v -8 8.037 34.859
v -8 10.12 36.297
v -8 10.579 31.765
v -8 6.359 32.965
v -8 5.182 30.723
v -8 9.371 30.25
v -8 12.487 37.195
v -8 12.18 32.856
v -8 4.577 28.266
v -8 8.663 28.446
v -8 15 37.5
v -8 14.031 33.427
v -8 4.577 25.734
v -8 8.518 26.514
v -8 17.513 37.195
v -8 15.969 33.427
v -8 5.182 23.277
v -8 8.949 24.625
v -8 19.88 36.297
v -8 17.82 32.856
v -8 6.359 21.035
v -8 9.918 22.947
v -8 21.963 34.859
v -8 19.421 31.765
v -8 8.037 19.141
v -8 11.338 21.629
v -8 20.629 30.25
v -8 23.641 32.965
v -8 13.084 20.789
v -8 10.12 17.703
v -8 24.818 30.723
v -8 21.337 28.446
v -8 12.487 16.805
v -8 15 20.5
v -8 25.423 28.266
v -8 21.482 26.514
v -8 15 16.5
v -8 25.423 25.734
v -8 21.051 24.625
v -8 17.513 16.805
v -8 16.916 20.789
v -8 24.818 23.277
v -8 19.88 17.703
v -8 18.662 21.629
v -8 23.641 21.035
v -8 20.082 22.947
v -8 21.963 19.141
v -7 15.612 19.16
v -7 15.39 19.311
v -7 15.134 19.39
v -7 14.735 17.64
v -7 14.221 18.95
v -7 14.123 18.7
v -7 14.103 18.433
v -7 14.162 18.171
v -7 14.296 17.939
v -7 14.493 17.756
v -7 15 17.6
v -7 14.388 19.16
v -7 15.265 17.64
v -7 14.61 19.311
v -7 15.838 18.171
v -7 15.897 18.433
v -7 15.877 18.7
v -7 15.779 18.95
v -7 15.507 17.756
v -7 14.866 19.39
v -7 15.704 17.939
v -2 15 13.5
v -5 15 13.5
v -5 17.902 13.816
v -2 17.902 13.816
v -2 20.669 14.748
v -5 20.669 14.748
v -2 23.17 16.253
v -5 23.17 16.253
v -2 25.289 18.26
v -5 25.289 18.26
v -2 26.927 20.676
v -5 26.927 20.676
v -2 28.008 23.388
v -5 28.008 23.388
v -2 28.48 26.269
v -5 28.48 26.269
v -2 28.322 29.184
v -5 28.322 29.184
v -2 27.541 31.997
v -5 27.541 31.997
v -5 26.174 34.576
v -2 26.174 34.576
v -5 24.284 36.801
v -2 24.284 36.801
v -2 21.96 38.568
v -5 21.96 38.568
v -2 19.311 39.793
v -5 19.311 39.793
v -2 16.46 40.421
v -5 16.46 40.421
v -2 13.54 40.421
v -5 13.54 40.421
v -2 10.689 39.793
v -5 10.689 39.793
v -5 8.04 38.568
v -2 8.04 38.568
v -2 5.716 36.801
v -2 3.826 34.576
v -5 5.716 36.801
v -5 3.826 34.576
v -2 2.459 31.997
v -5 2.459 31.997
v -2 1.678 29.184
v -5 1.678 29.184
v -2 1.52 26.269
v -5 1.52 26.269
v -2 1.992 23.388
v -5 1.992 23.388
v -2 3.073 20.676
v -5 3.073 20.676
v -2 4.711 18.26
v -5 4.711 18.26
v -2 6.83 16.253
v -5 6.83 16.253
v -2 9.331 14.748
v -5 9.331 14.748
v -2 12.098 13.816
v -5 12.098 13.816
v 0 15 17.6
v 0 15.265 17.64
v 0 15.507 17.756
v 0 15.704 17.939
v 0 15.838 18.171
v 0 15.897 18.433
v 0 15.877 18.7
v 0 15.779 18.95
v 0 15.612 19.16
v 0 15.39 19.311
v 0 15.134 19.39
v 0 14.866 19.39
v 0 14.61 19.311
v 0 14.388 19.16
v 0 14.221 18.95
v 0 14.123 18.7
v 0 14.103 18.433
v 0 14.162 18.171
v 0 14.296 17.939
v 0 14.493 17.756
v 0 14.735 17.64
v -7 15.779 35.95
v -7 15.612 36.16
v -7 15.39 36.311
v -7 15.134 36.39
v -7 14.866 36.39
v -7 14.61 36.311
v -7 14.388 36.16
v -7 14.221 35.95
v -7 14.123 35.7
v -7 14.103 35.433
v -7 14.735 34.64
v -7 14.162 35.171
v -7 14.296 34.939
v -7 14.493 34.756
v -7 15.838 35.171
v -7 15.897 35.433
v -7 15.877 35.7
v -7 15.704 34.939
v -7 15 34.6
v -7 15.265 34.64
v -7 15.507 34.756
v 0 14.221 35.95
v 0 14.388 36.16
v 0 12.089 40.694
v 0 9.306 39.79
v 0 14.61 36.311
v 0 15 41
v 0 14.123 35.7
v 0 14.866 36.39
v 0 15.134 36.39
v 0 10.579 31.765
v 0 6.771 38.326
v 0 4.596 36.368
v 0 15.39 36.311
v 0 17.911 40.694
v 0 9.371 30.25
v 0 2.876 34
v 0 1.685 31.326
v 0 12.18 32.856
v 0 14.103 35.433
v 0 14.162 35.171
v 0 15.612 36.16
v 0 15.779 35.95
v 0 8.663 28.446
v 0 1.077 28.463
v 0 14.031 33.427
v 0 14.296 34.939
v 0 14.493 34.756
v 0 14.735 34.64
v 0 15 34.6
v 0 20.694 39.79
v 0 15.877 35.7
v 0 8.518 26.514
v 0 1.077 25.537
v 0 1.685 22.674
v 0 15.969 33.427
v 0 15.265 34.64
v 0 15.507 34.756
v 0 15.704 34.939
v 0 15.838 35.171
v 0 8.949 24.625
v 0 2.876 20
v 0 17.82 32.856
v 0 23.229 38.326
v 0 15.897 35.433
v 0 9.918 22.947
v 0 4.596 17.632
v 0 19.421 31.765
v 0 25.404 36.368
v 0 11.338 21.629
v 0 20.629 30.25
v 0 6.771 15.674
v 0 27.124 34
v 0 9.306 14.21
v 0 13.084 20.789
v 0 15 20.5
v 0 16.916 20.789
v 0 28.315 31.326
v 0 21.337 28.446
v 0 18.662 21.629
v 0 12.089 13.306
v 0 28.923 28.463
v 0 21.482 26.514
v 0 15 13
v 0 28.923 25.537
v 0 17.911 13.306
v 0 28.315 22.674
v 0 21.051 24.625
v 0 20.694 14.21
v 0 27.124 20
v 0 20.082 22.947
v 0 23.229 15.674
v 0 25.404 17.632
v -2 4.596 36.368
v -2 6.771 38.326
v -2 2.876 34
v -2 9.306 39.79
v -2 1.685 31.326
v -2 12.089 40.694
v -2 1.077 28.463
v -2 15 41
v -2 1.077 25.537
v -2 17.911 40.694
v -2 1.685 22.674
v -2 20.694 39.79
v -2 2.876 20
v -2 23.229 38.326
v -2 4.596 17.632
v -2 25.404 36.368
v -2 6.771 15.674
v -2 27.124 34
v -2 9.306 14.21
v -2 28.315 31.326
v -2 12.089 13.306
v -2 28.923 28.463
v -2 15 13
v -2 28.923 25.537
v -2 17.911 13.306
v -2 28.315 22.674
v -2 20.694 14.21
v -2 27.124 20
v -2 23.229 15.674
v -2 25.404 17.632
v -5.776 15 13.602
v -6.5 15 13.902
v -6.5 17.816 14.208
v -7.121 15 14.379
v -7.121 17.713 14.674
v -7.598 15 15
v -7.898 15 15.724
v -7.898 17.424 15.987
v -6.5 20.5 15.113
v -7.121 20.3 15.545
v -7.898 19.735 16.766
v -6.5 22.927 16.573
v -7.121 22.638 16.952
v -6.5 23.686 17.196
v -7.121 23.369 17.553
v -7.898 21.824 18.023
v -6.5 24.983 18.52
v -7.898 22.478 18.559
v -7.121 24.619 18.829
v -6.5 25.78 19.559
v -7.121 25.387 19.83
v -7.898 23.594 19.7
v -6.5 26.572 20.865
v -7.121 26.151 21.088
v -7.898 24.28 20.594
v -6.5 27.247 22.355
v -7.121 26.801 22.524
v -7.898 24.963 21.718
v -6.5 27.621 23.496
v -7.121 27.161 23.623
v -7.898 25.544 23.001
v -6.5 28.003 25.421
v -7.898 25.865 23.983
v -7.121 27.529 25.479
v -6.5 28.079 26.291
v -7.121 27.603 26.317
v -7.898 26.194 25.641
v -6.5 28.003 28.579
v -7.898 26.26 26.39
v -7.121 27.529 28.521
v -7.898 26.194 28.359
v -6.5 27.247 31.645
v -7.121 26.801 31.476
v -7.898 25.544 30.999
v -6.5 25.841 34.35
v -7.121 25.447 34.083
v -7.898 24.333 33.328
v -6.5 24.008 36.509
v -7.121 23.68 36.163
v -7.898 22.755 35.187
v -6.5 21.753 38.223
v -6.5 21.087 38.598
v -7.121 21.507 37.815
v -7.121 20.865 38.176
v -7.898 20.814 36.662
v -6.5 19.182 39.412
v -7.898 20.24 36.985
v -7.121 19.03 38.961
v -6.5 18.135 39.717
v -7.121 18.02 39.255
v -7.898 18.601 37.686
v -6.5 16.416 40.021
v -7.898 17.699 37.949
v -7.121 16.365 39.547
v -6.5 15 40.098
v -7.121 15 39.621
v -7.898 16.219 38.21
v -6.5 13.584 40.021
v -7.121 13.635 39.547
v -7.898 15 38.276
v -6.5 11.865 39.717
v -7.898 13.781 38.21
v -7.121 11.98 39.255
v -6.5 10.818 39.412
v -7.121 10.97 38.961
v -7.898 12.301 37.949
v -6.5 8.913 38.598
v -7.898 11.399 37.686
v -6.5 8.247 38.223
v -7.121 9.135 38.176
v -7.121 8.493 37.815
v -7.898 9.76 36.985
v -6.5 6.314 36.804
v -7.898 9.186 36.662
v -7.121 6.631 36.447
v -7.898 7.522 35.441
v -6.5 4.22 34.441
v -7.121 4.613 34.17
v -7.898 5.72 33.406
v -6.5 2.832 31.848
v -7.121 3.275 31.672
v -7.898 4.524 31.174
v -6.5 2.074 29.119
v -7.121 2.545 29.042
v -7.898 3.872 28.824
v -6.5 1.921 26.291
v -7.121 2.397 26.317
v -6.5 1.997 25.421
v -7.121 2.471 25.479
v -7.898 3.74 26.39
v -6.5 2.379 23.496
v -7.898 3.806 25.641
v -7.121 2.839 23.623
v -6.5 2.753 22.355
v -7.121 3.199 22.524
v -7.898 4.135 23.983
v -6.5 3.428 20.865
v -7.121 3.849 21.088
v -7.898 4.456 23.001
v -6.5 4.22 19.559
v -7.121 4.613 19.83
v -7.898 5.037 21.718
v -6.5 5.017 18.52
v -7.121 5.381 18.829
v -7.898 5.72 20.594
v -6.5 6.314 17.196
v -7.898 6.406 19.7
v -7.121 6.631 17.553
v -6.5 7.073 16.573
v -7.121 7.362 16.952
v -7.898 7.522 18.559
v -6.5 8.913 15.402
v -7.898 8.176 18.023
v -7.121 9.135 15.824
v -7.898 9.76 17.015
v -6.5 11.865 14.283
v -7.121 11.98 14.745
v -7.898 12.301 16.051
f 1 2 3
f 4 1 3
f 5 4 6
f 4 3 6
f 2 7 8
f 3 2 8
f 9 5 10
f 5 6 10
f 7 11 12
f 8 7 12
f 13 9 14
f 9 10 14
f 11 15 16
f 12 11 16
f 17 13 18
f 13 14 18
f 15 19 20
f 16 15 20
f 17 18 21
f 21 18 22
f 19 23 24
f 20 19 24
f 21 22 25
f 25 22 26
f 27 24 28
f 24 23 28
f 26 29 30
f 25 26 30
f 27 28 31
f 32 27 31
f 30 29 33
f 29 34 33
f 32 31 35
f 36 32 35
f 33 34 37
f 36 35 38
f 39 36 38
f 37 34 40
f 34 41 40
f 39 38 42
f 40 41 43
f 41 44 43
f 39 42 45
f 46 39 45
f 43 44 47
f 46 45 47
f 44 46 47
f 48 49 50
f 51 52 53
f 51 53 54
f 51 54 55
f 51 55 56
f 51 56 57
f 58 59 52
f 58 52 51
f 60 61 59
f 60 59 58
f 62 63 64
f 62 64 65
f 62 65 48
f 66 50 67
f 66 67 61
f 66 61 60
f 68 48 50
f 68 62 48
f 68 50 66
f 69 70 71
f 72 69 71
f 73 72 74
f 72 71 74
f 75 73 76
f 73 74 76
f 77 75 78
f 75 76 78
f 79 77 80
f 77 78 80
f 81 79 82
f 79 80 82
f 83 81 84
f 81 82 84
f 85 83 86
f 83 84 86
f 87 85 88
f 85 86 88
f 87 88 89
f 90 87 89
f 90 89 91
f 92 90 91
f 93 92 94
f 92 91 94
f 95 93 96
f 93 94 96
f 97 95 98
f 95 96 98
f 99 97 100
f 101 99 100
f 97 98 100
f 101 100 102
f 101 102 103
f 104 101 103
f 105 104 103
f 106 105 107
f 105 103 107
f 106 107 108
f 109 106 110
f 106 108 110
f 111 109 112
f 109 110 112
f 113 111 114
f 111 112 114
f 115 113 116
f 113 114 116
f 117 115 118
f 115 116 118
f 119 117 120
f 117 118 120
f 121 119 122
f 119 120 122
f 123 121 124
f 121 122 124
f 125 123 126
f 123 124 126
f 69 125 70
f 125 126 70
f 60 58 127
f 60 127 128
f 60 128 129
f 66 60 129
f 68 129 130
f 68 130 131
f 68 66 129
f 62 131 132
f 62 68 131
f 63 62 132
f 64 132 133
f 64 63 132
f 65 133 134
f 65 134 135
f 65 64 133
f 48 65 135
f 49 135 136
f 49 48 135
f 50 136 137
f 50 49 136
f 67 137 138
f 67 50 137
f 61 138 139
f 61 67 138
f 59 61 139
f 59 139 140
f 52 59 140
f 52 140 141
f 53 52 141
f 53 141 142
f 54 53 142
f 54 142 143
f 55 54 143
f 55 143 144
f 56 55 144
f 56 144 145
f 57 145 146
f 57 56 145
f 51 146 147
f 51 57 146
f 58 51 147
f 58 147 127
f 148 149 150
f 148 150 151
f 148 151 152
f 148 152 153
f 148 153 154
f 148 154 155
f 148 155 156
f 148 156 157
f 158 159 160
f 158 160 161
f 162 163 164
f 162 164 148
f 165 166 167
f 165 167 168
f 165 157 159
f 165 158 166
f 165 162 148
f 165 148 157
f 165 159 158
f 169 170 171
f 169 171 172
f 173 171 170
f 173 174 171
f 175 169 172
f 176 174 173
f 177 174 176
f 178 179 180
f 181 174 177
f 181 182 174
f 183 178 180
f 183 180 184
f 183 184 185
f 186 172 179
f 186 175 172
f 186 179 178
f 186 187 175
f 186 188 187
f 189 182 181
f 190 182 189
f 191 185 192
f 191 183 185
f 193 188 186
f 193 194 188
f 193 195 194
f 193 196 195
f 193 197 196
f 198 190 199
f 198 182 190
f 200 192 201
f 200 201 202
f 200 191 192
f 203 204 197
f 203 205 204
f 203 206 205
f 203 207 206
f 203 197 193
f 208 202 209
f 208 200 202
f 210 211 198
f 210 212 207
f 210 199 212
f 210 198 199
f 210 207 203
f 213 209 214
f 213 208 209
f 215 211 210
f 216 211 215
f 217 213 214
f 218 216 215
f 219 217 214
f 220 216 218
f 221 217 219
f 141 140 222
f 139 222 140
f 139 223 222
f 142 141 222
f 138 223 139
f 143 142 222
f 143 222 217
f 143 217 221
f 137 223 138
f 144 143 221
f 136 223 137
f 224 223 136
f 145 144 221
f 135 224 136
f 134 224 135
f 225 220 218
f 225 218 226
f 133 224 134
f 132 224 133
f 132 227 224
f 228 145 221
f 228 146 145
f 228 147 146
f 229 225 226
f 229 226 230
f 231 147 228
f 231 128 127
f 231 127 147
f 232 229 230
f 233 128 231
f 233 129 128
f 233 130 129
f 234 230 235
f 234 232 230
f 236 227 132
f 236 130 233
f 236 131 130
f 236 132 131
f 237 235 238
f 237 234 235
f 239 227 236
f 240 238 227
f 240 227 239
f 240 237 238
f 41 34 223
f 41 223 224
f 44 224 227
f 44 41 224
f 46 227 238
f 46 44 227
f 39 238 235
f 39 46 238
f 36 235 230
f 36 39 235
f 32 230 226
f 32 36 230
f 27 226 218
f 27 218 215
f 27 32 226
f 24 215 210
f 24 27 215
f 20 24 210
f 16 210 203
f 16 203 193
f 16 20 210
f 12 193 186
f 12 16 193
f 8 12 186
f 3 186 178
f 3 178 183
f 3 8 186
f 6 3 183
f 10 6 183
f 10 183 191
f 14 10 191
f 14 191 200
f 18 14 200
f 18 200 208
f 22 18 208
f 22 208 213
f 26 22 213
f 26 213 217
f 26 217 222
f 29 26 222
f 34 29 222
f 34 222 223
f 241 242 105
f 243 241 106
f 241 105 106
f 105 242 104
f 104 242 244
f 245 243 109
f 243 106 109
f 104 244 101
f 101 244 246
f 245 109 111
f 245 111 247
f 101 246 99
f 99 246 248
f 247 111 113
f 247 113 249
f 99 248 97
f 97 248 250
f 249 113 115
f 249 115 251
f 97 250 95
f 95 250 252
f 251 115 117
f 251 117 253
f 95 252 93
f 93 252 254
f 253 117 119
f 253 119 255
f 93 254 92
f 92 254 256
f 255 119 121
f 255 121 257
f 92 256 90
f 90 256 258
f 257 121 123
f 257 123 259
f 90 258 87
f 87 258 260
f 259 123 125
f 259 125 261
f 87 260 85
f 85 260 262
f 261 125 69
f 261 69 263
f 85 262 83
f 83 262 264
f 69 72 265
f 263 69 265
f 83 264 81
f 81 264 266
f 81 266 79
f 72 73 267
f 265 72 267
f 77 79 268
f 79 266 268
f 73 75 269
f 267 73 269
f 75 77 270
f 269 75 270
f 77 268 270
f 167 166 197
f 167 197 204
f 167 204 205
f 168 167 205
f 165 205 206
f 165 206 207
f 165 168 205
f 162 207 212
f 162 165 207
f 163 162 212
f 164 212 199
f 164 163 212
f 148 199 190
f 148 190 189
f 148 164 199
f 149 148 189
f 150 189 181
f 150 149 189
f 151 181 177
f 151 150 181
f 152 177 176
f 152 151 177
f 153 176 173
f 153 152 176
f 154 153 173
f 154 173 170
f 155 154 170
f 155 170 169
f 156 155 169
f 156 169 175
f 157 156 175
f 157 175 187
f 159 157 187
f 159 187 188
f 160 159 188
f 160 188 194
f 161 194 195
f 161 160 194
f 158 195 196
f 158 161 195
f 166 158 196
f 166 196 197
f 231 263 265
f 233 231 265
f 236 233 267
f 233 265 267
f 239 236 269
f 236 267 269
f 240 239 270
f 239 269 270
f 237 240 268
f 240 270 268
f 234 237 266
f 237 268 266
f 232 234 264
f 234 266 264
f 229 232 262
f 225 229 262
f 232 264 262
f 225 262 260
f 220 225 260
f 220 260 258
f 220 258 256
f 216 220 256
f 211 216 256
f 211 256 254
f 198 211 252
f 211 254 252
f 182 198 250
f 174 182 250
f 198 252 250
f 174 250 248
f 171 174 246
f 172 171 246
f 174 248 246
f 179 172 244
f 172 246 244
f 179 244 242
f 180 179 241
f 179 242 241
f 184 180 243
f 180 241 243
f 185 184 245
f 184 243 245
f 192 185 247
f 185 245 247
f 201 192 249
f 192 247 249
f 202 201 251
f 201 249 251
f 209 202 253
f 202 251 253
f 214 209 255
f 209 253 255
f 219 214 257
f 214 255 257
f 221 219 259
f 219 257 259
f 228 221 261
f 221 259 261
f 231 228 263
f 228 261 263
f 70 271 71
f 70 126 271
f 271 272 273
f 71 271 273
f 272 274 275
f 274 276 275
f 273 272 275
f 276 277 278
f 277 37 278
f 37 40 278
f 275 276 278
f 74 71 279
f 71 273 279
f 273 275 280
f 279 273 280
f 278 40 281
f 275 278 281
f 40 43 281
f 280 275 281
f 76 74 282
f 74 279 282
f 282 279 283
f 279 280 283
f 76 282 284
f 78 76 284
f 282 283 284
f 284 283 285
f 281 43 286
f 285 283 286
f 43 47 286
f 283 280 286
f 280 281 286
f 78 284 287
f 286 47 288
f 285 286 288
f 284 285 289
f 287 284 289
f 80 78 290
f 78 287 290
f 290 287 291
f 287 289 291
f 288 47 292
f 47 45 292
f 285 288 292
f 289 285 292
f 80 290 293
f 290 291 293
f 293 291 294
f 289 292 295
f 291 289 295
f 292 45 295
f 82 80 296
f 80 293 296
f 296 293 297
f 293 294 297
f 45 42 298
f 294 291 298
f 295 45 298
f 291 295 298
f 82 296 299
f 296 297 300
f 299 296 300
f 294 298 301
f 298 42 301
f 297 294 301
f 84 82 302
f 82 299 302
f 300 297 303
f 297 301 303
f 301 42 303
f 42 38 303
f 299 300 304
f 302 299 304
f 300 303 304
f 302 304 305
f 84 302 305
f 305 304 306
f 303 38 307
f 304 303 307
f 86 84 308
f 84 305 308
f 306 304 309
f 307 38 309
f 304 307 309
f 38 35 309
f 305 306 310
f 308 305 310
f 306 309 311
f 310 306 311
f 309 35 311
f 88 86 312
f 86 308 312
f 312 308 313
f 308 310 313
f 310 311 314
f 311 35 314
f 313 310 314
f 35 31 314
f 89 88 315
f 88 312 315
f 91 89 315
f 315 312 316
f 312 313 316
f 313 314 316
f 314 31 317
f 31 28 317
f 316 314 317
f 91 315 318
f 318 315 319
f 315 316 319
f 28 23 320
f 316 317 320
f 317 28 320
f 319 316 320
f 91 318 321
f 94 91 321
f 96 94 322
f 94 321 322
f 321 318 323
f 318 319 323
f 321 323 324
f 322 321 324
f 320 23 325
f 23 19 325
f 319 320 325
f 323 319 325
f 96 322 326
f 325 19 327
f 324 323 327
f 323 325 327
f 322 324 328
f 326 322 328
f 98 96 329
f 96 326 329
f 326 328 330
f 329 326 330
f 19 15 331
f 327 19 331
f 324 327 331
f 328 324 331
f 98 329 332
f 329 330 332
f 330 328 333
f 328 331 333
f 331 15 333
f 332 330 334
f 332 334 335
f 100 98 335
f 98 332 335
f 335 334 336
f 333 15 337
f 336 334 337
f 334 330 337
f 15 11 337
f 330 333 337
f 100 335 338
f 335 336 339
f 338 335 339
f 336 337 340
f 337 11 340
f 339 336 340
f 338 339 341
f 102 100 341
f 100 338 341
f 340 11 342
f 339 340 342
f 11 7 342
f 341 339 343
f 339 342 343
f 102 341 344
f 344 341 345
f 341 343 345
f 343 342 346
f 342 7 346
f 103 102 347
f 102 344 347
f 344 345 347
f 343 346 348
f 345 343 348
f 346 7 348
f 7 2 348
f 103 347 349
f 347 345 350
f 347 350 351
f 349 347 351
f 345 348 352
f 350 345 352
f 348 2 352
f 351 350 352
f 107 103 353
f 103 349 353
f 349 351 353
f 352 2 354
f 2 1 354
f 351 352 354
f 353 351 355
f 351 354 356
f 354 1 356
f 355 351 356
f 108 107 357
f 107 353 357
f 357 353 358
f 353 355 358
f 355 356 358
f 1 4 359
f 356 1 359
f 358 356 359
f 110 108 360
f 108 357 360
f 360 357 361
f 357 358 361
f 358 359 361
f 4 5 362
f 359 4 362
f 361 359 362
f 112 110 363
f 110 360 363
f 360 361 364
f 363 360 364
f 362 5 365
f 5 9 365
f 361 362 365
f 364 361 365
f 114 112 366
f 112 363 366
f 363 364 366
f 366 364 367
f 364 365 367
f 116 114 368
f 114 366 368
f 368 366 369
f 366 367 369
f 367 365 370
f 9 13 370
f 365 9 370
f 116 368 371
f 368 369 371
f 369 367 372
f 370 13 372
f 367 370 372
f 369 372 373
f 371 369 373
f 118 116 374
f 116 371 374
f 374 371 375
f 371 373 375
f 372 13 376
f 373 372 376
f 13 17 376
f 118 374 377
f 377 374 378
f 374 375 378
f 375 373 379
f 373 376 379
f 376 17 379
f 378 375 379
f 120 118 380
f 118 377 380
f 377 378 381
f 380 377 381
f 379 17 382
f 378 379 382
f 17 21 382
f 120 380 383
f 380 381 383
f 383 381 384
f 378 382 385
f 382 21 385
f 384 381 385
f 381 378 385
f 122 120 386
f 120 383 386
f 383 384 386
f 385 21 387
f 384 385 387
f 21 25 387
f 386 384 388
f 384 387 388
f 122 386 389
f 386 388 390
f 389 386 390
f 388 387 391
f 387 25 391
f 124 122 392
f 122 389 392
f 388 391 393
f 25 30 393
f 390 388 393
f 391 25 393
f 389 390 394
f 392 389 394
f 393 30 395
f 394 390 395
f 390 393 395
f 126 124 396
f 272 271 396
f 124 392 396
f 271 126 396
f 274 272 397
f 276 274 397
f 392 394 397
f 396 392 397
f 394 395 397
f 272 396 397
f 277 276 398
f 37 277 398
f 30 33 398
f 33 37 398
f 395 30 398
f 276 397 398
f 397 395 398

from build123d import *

# Parameters (mm, degrees)
CYLINDER055_R           = 6.5
CYLINDER055_DEPTH       = 10
CYLINDER055_PITCH_ANGLE = 90
CYLINDER108_R           = 0.9
CYLINDER108_DEPTH       = 7
CYLINDER108_PITCH_ANGLE = 90
CYLINDER107_R           = 0.9
CYLINDER107_DEPTH       = 7
CYLINDER107_PITCH_ANGLE = 90
CYLINDER058_R           = 13.5
CYLINDER058_DEPTH       = 6
CYLINDER058_PITCH_ANGLE = 90
CYLINDER011_R           = 14
CYLINDER011_DEPTH       = 2
CYLINDER011_PITCH_ANGLE = 90
FILLET038_R             = 3


with BuildPart() as cylinder055:
    # Cylinder055 → Cylinder055 (new body)
    with BuildSketch(Plane.XY):
        Circle(CYLINDER055_R)
    extrude(amount=CYLINDER055_DEPTH)


with BuildPart() as cylinder055_1:
    # Cylinder055 pitch: moved
    add(cylinder055.part.rotate(Axis((0, 0, 0), (0, 1, 0)), CYLINDER055_PITCH_ANGLE))


with BuildPart() as cylinder055_2:
    # Cylinder055 placement: moved
    add(cylinder055_1.part.moved(Location((-10, 15, 27))))


with BuildPart() as cylinder108:
    # Cylinder108 → Cylinder108 (new body)
    with BuildSketch(Plane.XY):
        Circle(CYLINDER108_R)
    extrude(amount=CYLINDER108_DEPTH)


with BuildPart() as cylinder108_1:
    # Cylinder108 pitch: moved
    add(cylinder108.part.rotate(Axis((0, 0, 0), (0, 1, 0)), CYLINDER108_PITCH_ANGLE))


with BuildPart() as cylinder108_2:
    # Cylinder108 placement: moved
    add(cylinder108_1.part.moved(Location((-7, 15, 35.5))))


with BuildPart() as fusion056:
    # Cylinder107 → Cylinder107 (new body)
    with BuildSketch(Plane.XY):
        Circle(CYLINDER107_R)
    extrude(amount=CYLINDER107_DEPTH)


with BuildPart() as fusion056_1:
    # Cylinder107 pitch: moved
    add(fusion056.part.rotate(Axis((0, 0, 0), (0, 1, 0)), CYLINDER107_PITCH_ANGLE))


with BuildPart() as fusion056_2:
    # Cylinder107 placement: moved
    add(fusion056_1.part.moved(Location((-7, 15, 18.5))))

    # Fusion056: union Cylinder055, Cylinder108
    add(cylinder055_2.part)
    add(cylinder108_2.part)


with BuildPart() as cylinder058:
    # Cylinder058 → Cylinder058 (new body)
    with BuildSketch(Plane.XY):
        Circle(CYLINDER058_R)
    extrude(amount=CYLINDER058_DEPTH)


with BuildPart() as cylinder058_1:
    # Cylinder058 pitch: moved
    add(cylinder058.part.rotate(Axis((0, 0, 0), (0, 1, 0)), CYLINDER058_PITCH_ANGLE))


with BuildPart() as cylinder058_2:
    # Cylinder058 placement: moved
    add(cylinder058_1.part.moved(Location((-8, 15, 27))))


with BuildPart() as clutch_part:
    # Cylinder011 → Cylinder011 (new body)
    with BuildSketch(Plane.XY):
        Circle(CYLINDER011_R)
    extrude(amount=CYLINDER011_DEPTH)


with BuildPart() as clutch_part_1:
    # Cylinder011 pitch: moved
    add(clutch_part.part.rotate(Axis((0, 0, 0), (0, 1, 0)), CYLINDER011_PITCH_ANGLE))


with BuildPart() as clutch_part_2:
    # Cylinder011 placement: moved
    add(clutch_part_1.part.moved(Location((-2, 15, 27))))

    # Fusion029: union Cylinder058
    add(cylinder058_2.part)

    # Cut047: cut Fusion056
    add(fusion056_2.part, mode=Mode.SUBTRACT)

    # Fillet038
    fillet038_edges = [clutch_part_2.edges().sort_by_distance(p)[0] for p in [
        (-8, 15, 40.5),
    ]]
    fillet(fillet038_edges, radius=FILLET038_R)


solid = clutch_part_2.part
